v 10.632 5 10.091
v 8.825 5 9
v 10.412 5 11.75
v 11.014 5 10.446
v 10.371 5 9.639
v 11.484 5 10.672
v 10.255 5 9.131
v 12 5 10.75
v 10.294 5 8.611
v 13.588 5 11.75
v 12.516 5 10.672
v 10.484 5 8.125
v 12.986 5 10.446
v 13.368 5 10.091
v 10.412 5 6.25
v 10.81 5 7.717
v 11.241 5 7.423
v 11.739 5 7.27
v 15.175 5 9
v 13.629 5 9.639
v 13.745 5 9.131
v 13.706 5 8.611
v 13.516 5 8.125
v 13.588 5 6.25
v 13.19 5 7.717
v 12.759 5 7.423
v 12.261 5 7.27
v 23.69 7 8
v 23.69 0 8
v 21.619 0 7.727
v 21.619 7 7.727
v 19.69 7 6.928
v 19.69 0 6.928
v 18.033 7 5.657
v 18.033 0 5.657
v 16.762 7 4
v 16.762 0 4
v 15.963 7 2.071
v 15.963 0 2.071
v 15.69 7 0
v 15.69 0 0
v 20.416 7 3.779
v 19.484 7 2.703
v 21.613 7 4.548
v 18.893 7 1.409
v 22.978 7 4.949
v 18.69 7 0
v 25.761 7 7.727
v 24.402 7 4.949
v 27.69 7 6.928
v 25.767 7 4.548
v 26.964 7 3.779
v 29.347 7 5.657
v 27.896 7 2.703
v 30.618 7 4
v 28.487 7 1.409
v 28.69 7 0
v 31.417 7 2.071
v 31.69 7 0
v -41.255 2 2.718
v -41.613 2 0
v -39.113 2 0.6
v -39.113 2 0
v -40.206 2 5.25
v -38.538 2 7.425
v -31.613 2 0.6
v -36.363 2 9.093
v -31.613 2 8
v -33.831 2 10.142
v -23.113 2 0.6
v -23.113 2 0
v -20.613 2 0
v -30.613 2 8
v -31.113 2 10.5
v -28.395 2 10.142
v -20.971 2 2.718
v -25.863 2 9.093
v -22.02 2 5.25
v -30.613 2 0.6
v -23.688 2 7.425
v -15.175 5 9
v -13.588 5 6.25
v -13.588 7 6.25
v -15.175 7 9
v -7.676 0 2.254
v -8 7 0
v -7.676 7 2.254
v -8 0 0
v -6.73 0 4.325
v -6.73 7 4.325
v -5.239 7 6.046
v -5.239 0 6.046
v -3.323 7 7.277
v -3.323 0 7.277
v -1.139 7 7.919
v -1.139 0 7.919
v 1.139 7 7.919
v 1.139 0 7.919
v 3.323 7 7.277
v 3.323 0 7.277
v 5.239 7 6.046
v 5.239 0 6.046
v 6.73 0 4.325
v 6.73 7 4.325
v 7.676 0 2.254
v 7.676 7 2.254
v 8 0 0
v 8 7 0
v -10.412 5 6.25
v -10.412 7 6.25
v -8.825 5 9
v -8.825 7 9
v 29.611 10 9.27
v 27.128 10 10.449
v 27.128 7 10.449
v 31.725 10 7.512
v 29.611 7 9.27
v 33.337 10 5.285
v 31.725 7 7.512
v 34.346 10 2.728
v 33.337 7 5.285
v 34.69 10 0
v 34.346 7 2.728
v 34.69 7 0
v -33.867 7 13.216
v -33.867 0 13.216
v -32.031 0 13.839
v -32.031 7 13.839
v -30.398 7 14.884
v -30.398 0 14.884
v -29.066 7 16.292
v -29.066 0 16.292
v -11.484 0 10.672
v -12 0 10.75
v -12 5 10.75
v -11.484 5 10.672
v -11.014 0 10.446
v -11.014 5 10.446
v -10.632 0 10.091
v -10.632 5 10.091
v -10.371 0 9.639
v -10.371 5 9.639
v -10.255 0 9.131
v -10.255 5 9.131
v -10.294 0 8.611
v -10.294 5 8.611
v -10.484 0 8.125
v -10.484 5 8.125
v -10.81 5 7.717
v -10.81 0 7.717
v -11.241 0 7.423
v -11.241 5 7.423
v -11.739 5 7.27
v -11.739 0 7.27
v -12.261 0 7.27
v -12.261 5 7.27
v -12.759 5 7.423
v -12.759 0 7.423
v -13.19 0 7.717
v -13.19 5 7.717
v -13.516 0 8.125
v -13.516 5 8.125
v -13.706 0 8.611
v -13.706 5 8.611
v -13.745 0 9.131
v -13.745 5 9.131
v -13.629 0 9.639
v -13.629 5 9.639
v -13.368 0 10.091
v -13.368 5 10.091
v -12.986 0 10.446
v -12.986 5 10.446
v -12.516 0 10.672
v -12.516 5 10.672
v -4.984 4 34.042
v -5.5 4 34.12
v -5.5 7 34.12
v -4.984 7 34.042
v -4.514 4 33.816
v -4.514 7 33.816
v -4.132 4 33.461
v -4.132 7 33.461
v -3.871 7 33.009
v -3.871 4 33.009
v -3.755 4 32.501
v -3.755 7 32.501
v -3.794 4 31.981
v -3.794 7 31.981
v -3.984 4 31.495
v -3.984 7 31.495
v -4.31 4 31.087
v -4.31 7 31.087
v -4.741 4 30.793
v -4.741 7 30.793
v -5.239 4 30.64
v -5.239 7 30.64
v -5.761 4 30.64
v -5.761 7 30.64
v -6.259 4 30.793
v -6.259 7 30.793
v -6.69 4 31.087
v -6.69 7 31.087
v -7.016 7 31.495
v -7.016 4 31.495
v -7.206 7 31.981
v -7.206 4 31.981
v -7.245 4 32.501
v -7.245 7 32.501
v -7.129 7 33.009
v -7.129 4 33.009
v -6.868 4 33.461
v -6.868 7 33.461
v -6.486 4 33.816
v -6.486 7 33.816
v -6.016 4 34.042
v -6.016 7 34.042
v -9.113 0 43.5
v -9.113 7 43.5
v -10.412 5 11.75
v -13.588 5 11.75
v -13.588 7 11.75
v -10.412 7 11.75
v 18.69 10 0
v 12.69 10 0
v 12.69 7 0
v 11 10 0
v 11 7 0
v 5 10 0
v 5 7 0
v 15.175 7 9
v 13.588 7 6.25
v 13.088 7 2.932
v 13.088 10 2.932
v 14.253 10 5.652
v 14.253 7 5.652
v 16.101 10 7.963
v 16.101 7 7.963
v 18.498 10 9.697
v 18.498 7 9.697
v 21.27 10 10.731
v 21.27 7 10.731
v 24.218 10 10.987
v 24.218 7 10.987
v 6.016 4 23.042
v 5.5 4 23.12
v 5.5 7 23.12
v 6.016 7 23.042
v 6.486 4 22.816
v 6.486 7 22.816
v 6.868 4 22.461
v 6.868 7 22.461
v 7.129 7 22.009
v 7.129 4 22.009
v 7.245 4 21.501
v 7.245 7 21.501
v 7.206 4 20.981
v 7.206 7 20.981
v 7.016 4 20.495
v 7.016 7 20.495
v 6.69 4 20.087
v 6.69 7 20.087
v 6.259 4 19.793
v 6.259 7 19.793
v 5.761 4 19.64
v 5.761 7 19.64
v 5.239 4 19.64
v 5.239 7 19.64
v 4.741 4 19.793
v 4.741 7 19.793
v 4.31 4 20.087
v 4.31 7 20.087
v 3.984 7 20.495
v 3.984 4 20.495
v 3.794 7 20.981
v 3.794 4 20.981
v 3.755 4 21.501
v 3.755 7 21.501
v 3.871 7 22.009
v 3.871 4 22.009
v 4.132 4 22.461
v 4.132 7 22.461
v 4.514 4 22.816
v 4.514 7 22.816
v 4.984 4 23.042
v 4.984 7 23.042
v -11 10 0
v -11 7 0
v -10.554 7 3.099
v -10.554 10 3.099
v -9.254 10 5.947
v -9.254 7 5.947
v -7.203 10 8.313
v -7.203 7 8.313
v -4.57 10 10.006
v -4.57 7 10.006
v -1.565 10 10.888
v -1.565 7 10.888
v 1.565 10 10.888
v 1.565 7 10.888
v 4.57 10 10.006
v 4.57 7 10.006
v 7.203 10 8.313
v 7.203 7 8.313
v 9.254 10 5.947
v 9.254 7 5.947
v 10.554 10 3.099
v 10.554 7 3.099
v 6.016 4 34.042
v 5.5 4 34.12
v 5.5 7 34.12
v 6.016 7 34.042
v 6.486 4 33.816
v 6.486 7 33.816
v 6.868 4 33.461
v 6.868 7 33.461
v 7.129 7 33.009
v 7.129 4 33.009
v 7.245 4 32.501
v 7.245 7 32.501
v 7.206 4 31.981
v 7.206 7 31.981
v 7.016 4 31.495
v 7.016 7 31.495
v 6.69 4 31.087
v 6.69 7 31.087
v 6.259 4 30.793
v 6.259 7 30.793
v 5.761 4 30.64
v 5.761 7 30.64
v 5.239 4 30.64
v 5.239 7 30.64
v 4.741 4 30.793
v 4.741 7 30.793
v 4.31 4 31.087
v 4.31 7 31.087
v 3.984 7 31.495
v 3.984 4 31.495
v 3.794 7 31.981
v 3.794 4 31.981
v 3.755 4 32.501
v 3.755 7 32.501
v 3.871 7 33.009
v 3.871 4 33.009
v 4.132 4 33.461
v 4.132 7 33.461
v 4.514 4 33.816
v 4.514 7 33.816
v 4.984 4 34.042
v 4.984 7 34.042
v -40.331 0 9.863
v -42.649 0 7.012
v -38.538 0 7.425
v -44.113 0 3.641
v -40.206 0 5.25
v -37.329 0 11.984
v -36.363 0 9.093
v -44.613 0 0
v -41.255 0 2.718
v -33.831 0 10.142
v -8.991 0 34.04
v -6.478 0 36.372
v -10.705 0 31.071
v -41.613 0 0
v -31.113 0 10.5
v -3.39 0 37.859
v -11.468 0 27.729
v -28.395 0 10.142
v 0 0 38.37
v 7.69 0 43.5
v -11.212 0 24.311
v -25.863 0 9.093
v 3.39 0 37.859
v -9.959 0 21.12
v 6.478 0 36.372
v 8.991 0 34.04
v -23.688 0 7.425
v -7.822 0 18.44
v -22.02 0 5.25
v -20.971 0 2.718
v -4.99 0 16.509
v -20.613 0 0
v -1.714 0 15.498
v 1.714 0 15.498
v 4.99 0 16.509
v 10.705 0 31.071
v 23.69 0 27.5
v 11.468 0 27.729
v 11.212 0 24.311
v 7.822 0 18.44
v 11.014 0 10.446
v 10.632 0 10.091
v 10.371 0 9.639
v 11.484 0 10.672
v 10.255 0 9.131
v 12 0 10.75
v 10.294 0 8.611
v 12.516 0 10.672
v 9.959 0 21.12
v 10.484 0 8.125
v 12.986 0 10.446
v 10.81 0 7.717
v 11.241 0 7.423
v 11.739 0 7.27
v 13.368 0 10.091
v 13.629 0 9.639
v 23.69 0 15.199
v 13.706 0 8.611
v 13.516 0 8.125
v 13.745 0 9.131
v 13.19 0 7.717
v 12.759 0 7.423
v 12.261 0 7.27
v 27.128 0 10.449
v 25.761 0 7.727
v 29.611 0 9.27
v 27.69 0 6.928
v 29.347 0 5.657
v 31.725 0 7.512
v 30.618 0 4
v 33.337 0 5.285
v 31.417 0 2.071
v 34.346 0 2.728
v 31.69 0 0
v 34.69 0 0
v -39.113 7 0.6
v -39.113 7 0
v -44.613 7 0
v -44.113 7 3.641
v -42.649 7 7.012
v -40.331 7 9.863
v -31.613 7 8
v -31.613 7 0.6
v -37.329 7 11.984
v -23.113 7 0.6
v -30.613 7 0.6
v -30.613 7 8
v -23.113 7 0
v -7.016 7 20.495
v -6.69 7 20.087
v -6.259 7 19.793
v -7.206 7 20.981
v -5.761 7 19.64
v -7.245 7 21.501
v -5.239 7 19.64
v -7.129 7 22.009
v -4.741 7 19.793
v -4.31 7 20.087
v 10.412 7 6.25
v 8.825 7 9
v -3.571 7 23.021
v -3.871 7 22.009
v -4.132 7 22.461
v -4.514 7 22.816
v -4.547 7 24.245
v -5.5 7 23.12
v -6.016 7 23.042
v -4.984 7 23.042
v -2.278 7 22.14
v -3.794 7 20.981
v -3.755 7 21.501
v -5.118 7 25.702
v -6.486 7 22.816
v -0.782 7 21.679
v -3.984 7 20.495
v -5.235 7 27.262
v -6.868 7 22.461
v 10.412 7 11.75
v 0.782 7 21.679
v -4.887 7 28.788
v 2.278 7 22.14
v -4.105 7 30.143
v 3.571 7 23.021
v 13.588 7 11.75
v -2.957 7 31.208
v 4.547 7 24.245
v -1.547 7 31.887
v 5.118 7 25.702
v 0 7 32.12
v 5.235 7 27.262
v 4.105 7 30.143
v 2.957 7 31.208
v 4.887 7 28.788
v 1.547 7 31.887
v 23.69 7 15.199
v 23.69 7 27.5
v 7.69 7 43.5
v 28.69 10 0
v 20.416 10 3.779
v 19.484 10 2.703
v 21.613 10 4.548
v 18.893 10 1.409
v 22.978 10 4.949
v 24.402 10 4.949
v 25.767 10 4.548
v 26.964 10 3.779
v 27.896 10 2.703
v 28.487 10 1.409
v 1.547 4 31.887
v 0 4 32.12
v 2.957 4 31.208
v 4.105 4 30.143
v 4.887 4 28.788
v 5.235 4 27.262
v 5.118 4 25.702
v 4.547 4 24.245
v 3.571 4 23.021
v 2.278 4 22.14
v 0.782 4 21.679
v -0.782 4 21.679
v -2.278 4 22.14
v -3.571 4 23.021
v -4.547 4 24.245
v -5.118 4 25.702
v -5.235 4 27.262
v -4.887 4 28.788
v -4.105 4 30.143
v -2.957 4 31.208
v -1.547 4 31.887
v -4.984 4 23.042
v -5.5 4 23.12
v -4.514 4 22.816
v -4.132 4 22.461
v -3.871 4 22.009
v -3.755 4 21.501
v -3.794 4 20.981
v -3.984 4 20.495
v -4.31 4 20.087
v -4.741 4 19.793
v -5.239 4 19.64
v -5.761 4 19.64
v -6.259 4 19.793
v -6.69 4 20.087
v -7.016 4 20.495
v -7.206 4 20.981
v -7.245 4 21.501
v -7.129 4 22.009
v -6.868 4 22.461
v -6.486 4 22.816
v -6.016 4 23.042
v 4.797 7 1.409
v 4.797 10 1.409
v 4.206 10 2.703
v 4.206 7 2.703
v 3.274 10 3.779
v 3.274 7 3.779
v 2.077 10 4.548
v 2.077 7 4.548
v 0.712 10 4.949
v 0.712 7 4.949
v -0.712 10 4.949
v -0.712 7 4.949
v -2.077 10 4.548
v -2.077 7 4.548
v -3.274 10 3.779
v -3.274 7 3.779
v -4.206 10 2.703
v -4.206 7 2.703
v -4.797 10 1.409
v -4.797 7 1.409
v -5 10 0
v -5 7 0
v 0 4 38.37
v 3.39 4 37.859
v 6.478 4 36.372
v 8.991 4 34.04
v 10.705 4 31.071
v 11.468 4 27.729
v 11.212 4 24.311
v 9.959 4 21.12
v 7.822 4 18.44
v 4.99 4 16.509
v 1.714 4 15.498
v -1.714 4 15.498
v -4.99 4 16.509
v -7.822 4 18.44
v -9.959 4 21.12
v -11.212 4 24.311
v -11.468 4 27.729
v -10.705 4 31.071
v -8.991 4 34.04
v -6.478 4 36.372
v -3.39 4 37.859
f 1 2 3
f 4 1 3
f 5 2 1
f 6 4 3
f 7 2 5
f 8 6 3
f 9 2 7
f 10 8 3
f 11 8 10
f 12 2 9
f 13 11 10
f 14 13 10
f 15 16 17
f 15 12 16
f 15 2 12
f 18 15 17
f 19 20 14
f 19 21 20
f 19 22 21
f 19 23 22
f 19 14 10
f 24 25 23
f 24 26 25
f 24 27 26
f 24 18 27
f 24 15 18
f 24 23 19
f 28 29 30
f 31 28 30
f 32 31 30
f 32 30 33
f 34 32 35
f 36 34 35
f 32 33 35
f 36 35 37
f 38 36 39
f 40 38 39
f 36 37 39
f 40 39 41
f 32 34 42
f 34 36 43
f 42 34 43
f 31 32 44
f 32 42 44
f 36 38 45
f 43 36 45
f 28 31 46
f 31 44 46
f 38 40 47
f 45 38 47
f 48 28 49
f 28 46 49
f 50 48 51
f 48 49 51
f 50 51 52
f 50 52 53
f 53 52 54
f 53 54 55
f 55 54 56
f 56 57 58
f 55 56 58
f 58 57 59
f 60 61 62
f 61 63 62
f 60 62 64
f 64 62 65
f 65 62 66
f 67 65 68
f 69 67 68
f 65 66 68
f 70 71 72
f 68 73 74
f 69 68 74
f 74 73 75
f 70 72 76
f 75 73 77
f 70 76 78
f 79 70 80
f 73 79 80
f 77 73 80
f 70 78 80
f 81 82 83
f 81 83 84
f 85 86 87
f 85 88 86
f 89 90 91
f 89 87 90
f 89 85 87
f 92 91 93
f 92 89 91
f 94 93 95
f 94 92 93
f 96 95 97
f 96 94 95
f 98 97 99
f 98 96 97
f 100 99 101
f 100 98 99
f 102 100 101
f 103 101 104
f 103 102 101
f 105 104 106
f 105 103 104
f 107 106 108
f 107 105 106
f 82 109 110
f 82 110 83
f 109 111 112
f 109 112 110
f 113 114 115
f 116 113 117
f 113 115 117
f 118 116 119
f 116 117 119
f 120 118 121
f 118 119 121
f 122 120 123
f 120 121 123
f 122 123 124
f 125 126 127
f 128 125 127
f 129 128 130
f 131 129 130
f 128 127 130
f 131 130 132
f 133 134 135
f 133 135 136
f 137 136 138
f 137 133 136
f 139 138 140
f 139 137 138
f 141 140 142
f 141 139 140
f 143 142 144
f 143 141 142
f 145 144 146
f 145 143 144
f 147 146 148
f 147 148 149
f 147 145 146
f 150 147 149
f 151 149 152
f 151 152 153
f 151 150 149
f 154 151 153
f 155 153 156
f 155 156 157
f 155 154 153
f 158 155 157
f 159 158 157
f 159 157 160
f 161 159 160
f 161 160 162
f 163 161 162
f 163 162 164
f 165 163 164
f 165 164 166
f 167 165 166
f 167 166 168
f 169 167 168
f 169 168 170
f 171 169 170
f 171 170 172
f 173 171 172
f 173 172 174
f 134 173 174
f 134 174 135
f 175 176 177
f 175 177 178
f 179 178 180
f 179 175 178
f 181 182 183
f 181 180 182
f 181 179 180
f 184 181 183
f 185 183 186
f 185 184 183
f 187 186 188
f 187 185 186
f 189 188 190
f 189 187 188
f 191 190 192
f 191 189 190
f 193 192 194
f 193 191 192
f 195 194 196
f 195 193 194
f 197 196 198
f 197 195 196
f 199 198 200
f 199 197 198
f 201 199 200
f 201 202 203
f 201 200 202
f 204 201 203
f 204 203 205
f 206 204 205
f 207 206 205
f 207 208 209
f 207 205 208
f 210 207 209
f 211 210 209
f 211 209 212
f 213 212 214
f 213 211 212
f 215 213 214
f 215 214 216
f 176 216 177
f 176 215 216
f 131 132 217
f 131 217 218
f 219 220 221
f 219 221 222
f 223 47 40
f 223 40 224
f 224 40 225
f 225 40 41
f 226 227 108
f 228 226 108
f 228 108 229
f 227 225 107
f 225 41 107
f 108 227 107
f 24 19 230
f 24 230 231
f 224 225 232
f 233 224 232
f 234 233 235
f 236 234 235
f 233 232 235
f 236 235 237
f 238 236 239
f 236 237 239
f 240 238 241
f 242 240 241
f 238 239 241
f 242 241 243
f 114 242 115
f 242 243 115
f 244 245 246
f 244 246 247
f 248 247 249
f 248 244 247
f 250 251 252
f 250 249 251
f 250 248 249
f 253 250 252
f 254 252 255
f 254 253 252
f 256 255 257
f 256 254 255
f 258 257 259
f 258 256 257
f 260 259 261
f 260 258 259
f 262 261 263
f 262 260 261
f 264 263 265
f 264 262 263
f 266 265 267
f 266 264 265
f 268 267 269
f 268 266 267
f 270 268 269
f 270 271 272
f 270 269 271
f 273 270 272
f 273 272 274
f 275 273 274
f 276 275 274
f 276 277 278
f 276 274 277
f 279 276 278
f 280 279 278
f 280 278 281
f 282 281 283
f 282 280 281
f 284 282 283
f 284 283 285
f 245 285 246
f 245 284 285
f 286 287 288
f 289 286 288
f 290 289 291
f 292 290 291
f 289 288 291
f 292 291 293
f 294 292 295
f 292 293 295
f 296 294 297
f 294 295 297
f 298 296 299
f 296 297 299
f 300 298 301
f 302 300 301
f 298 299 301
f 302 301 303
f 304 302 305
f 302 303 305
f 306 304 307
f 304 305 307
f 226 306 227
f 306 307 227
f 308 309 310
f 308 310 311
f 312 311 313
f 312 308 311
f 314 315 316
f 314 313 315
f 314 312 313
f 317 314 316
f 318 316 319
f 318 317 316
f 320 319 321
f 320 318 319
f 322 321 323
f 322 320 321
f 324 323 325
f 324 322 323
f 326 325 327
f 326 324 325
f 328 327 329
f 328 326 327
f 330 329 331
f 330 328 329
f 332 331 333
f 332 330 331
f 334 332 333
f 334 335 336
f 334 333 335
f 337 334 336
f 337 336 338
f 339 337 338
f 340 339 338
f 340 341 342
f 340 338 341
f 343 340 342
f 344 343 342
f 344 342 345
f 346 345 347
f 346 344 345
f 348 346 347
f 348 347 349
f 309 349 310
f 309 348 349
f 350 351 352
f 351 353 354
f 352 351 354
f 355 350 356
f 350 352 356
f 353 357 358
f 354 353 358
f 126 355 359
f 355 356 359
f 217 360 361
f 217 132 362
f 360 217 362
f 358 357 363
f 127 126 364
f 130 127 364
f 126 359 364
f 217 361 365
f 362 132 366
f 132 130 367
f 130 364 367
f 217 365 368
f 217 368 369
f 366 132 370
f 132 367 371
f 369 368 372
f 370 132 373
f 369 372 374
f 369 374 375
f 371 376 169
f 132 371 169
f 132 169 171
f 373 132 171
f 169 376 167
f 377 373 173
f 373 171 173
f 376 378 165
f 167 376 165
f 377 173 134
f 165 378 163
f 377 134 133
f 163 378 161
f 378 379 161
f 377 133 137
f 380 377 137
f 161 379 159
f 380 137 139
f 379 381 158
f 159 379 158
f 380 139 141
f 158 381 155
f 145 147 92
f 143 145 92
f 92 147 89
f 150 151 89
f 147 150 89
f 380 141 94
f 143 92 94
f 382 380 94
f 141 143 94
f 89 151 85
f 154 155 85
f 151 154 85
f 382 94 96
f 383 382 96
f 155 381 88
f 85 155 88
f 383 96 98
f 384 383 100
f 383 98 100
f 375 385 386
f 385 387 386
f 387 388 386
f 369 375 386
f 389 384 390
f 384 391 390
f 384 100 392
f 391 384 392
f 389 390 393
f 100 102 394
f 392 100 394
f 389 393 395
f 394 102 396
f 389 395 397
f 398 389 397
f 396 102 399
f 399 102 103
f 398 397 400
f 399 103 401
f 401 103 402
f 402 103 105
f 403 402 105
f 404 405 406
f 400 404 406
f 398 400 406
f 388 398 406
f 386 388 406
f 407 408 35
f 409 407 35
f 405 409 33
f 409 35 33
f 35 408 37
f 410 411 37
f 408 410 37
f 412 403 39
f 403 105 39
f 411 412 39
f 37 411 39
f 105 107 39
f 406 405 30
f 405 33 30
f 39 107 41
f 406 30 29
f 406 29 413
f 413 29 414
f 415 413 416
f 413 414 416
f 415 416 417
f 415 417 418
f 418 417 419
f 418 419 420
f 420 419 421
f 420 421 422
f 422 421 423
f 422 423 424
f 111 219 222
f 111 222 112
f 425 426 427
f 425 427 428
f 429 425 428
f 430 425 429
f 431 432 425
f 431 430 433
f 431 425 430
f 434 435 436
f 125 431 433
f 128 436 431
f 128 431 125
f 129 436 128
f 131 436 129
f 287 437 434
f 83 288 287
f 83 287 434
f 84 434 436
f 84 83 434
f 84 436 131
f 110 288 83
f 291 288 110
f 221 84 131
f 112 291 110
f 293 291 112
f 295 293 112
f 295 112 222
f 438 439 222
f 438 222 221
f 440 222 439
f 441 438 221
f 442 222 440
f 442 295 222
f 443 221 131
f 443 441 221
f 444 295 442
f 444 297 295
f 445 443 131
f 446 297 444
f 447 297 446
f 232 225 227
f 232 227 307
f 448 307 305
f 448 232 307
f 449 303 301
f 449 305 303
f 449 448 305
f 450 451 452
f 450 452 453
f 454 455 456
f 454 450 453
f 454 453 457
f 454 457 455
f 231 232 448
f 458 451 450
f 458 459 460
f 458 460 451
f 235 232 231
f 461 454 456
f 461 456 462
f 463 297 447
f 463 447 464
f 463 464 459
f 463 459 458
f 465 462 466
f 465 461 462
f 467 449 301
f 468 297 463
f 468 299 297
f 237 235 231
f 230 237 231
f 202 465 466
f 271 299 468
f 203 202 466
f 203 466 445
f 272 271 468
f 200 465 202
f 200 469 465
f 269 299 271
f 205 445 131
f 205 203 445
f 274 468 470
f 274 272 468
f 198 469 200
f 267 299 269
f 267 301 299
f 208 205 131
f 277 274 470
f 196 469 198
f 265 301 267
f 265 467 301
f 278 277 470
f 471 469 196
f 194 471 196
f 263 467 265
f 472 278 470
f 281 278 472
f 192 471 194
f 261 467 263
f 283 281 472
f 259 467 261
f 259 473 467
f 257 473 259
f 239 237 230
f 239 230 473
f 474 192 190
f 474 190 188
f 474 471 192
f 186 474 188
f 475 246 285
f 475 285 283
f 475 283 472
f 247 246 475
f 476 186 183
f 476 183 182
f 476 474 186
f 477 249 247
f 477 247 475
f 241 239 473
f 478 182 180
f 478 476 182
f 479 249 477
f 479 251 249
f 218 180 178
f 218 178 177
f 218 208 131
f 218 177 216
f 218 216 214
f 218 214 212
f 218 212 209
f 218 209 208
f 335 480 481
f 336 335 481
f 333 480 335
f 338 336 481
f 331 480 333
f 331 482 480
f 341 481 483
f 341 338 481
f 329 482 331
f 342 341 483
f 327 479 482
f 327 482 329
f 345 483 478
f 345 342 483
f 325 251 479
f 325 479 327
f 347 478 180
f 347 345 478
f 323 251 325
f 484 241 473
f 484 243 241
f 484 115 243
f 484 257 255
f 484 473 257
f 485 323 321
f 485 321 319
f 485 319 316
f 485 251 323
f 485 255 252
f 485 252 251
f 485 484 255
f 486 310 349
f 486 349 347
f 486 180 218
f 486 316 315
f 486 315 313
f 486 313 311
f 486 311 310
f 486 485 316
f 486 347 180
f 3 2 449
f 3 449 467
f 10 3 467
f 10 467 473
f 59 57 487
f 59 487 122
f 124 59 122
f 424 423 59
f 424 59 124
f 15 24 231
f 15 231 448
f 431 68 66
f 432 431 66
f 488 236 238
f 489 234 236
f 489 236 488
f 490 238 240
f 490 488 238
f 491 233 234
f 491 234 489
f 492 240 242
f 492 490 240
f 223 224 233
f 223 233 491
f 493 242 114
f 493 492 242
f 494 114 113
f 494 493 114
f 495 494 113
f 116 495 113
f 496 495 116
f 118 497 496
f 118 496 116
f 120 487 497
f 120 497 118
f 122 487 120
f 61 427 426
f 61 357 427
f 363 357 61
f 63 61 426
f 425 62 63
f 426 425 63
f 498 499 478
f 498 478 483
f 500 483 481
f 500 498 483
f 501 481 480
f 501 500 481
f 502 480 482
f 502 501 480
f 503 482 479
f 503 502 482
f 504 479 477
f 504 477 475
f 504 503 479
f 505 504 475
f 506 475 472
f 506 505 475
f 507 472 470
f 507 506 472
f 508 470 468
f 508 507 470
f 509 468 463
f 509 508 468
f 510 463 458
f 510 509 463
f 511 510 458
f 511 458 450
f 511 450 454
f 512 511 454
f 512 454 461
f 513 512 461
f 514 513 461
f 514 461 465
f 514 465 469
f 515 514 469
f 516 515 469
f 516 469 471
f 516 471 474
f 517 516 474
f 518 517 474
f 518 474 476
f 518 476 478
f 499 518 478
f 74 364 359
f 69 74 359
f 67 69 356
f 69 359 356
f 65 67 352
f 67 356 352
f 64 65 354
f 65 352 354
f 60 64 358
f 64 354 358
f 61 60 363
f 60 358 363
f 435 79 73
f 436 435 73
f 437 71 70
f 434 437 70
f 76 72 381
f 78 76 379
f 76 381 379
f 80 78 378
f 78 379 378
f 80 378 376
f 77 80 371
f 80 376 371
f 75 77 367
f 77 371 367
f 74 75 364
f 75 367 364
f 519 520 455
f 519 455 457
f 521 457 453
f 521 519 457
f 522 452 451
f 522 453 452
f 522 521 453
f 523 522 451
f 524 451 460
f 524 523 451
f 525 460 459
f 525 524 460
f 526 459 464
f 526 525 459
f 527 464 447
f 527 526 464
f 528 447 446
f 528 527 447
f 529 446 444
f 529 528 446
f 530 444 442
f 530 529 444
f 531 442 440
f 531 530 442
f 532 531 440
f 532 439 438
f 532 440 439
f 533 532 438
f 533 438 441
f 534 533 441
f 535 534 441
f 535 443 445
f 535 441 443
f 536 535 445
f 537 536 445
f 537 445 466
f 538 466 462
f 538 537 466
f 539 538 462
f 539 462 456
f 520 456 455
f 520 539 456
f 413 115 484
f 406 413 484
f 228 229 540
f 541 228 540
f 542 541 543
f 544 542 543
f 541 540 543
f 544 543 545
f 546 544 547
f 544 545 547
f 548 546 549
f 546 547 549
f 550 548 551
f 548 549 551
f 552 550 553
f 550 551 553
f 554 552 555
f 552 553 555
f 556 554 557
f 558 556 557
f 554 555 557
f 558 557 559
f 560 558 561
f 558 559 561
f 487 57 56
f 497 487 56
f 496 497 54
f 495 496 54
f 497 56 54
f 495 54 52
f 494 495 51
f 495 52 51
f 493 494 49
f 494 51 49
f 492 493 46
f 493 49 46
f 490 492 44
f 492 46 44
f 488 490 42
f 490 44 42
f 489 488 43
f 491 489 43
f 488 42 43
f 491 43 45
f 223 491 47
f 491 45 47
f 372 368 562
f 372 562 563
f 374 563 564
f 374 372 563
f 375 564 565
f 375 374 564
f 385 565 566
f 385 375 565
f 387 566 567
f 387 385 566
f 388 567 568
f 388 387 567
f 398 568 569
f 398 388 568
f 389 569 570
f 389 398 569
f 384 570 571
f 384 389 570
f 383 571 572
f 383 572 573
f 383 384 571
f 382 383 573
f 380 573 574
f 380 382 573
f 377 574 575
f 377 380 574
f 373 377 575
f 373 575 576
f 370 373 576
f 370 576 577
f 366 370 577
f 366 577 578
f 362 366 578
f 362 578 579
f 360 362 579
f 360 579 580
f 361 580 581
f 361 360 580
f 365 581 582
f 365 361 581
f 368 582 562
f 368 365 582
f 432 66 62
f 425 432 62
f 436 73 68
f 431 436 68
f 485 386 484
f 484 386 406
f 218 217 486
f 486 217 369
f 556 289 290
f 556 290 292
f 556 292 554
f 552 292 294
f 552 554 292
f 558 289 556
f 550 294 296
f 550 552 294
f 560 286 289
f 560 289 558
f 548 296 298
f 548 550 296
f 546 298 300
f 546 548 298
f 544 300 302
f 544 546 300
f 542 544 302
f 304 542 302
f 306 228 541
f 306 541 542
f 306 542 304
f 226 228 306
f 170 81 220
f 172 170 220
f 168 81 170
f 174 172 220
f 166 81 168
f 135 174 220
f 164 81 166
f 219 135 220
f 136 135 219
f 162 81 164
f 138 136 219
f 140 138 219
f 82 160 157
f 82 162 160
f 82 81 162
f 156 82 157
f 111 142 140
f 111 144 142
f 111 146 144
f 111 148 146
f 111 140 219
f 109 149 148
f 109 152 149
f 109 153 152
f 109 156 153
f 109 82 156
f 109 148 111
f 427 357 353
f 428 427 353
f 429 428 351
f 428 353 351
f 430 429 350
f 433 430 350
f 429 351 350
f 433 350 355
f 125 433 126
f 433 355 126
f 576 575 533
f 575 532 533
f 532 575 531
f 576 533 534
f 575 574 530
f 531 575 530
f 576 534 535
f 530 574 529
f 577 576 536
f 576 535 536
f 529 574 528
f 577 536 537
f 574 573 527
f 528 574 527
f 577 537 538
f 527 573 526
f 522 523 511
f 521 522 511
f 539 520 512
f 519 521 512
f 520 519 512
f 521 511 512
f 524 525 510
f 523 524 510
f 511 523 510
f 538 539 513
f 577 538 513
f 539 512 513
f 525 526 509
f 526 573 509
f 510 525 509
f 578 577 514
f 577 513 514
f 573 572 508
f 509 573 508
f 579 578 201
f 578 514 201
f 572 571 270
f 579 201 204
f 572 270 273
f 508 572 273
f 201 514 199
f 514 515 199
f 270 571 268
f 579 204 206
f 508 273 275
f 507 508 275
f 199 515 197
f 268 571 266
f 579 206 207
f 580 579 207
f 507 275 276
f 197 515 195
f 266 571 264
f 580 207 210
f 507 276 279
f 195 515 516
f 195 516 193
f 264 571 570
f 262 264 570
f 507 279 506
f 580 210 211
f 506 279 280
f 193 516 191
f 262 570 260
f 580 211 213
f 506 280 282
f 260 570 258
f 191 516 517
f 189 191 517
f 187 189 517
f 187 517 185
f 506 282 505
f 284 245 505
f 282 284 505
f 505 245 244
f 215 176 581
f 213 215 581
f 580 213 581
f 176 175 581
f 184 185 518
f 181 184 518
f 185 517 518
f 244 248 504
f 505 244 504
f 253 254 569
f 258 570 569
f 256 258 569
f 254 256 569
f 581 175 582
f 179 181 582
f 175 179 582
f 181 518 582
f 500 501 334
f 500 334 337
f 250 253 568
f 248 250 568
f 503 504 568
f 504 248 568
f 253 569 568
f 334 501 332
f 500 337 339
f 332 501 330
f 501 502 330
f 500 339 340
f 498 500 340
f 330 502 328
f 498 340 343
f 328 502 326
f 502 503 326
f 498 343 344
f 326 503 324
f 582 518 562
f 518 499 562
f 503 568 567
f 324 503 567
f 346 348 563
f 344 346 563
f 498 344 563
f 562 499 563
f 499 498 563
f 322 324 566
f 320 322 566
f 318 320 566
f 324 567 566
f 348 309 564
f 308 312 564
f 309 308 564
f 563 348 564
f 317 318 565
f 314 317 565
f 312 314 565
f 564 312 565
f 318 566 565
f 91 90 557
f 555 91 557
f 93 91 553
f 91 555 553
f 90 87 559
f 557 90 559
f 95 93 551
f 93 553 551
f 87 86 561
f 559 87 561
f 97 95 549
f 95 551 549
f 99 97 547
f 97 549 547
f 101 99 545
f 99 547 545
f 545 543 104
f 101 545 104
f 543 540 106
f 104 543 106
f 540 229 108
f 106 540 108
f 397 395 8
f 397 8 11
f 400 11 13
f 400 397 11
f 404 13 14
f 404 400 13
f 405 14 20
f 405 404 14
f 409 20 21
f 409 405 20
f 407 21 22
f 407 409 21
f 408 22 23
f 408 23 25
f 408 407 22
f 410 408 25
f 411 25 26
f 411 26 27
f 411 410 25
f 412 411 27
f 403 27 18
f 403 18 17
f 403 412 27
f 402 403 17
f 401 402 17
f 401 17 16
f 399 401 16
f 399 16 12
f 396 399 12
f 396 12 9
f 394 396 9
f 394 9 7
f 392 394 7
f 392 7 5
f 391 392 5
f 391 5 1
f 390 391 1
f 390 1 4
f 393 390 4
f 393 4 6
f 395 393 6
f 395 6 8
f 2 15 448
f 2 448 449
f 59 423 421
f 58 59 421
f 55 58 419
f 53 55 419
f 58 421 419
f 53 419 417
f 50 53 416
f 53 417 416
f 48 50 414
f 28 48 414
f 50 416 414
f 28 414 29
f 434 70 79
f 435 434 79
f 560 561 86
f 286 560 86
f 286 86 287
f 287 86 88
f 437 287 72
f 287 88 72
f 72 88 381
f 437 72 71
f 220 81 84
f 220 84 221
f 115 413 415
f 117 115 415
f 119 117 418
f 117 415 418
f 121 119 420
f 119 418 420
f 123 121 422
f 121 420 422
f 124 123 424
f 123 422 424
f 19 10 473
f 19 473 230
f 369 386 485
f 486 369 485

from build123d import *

# Parameters (mm, degrees)
SKETCH3_R               = 8
SKETCH3_W               = 54.803
SKETCH3_H               = 30
SKETCH3_R_2             = 5.25
BOSS_EXTRUDE1_DEPTH     = 7
CUT_EXTRUDE3_DEPTH      = 63.702230973
CUT_EXTRUDE3_DEPTH_BACK = 63.702230973
SKETCH4_R               = 1.75
CHAMFER1_SIZE           = 2.5
CUT_EXTRUDE5_DEPTH      = 63.702230973
CUT_EXTRUDE5_DEPTH_BACK = 63.702230973
SKETCH9_R               = 1.75
CUT_EXTRUDE6_START      = -2
SKETCH10_R              = 1.75
CUT_EXTRUDE6_DEPTH      = 2
CHAMFER3_SIZE2          = 22
CHAMFER3_SIZE           = 30
CHAMFER4_SIZE           = 16
FILLET1_DEPTH           = 7
BOSS_EXTRUDE6_START     = -5
SKETCH15_R              = 10.5
BOSS_EXTRUDE6_DEPTH     = 5
CUT_EXTRUDE7_DEPTH      = 63.702230973
CUT_EXTRUDE7_DEPTH_BACK = 63.702230973
SKETCH16_W              = 93.911326915
SKETCH16_H              = 20.32689663
SKETCH17_R              = 11.5
SKETCH17_R_2            = 5.25
CUT_EXTRUDE8_DEPTH      = 4
BOSS_EXTRUDE7_DEPTH     = 3


with BuildPart() as part:
    # Sketch3 → Boss-Extrude1 (new body)
    # profile 1 of 10: a face of its own
    with BuildSketch(Plane(origin=(0, 0, 0), x_dir=(1, 0, 0), z_dir=(0, 1, 0))):
        with BuildLine():
            ThreePointArc((-17.613, 0), (-21.567058454, 9.545941546), (-31.113, 13.5))
            Line((-31.113, 13.5), (-31.113, 10.5))
            ThreePointArc((-31.113, 10.5), (-23.688378798, 7.424621202), (-20.613, 0))
            ThreePointArc((-20.613, 0), (-23.688378798, -7.424621202), (-31.113, -10.5))
            Line((-31.113, -10.5), (-31.113, -13.5))
            ThreePointArc((-31.113, -13.5), (-21.567058454, -9.545941546), (-17.613, 0))
        make_face()
    # profile 2 of 10: a face of its own
    with BuildSketch(Plane(origin=(0, 0, 0), x_dir=(1, 0, 0), z_dir=(0, 1, 0))):
        with BuildLine():
            Line((-31.113, 10.5), (-31.113, 13.5))
            ThreePointArc((-31.113, 13.5), (-44.613, 0), (-31.113, -13.5))
            Line((-31.113, -13.5), (-31.113, -10.5))
            ThreePointArc((-31.113, -10.5), (-41.613, 0), (-31.113, 10.5))
        make_face()
    # profile 3 of 10: a face of its own
    with BuildSketch(Plane(origin=(0, 0, 0), x_dir=(1, 0, 0), z_dir=(0, 1, 0))):
        with BuildLine():
            Line((23.69, 13.5), (-31.113, 13.5))
            ThreePointArc((-31.113, 13.5), (-21.567058454, 9.545941546), (-17.613, 0))
            ThreePointArc((-17.613, 0), (-21.567058454, -9.545941546), (-31.113, -13.5))
            Line((-31.113, -13.5), (23.69, -13.5))
            Line((23.69, -13.5), (23.69, -11))
            ThreePointArc((23.69, -11), (12.69, 0), (23.69, 11))
            Line((23.69, 11), (23.69, 13.5))
        make_face()
        with Locations(Location((0, 0, 0), (0, 0, 270))):
            Circle(SKETCH3_R, mode=Mode.SUBTRACT)
    # profile 4 of 10: a face of its own
    with BuildSketch(Plane(origin=(0, 0, 0), x_dir=(1, 0, 0), z_dir=(0, 1, 0))):
        with BuildLine():
            ThreePointArc((-17.613, 0), (-21.567058454, 9.545941546), (-31.113, 13.5))
            Line((-31.113, 13.5), (-31.113, 10.5))
            ThreePointArc((-31.113, 10.5), (-23.688378798, 7.424621202), (-20.613, 0))
            ThreePointArc((-20.613, 0), (-23.688378798, -7.424621202), (-31.113, -10.5))
            Line((-31.113, -10.5), (-31.113, -13.5))
            ThreePointArc((-31.113, -13.5), (-21.567058454, -9.545941546), (-17.613, 0))
        make_face()
    # profile 5 of 10: a face of its own
    with BuildSketch(Plane(origin=(0, 0, 0), x_dir=(1, 0, 0), z_dir=(0, 1, 0))):
        with BuildLine():
            Line((-31.113, 10.5), (-31.113, 13.5))
            ThreePointArc((-31.113, 13.5), (-44.613, 0), (-31.113, -13.5))
            Line((-31.113, -13.5), (-31.113, -10.5))
            ThreePointArc((-31.113, -10.5), (-41.613, 0), (-31.113, 10.5))
        make_face()
    # profile 6 of 10: a face of its own
    with BuildSketch(Plane(origin=(0, 0, 0), x_dir=(1, 0, 0), z_dir=(0, 1, 0))):
        with BuildLine():
            ThreePointArc((34.69, 0), (31.468174593, 7.778174593), (23.69, 11))
            Line((23.69, 11), (23.69, 8))
            ThreePointArc((23.69, 8), (29.346854249, 5.656854249), (31.69, 0))
            ThreePointArc((31.69, 0), (29.346854249, -5.656854249), (23.69, -8))
            Line((23.69, -8), (23.69, -11))
            ThreePointArc((23.69, -11), (31.468174593, -7.778174593), (34.69, 0))
        make_face()
    # profile 7 of 10: a face of its own
    with BuildSketch(Plane(origin=(0, 0, 0), x_dir=(1, 0, 0), z_dir=(0, 1, 0))):
        with BuildLine():
            Line((23.69, 8), (23.69, 11))
            ThreePointArc((23.69, 11), (12.69, 0), (23.69, -11))
            Line((23.69, -11), (23.69, -8))
            ThreePointArc((23.69, -8), (15.69, 0), (23.69, 8))
        make_face()
    # profile 8 of 10: a face of its own
    with BuildSketch(Plane(origin=(0, 0, 0), x_dir=(1, 0, 0), z_dir=(0, 1, 0))):
        with Locations((-3.7115, -28.5)):
            Rectangle(SKETCH3_W, SKETCH3_H)
        with Locations(Location((0, -26.87, 0), (0, 0, 270))):
            Circle(SKETCH3_R_2, mode=Mode.SUBTRACT)
    # profile 9 of 10: a face of its own
    with BuildSketch(Plane(origin=(0, 0, 0), x_dir=(1, 0, 0), z_dir=(0, 1, 0))):
        with BuildLine():
            ThreePointArc((34.69, 0), (31.468174593, 7.778174593), (23.69, 11))
            Line((23.69, 11), (23.69, 8))
            ThreePointArc((23.69, 8), (29.346854249, 5.656854249), (31.69, 0))
            ThreePointArc((31.69, 0), (29.346854249, -5.656854249), (23.69, -8))
            Line((23.69, -8), (23.69, -11))
            ThreePointArc((23.69, -11), (31.468174593, -7.778174593), (34.69, 0))
        make_face()
    # profile 10 of 10: a face of its own
    with BuildSketch(Plane(origin=(0, 0, 0), x_dir=(1, 0, 0), z_dir=(0, 1, 0))):
        with BuildLine():
            Line((23.69, 8), (23.69, 11))
            ThreePointArc((23.69, 11), (12.69, 0), (23.69, -11))
            Line((23.69, -11), (23.69, -8))
            ThreePointArc((23.69, -8), (15.69, 0), (23.69, 8))
        make_face()
    extrude(amount=BOSS_EXTRUDE1_DEPTH)

    # Sketch4 → Cut-Extrude3 (cut, two sides: drawn at the far end of the back side and taken through both)
    with BuildSketch(Plane(origin=(0, 0, 0), x_dir=(1, 0, 0), z_dir=(0, 1, 0)).offset(-CUT_EXTRUDE3_DEPTH_BACK)):
        with Locations(Location((5.5, -21.37, 0), (0, 0, 270))):
            Circle(SKETCH4_R)
        with Locations(Location((5.5, -32.37, 0), (0, 0, 270))):
            Circle(SKETCH4_R)
        with Locations(Location((-5.5, -32.37, 0), (0, 0, 270))):
            Circle(SKETCH4_R)
        with Locations(Location((-5.5, -21.37, 0), (0, 0, 270))):
            Circle(SKETCH4_R)
    extrude(amount=CUT_EXTRUDE3_DEPTH + CUT_EXTRUDE3_DEPTH_BACK, mode=Mode.SUBTRACT)

    # Chamfer1
    # the kernel refuses this chamfer: 2.5 mm, written as the material it adds along each edge
    with BuildSketch(Plane(origin=(23.69, 0, -11), x_dir=(0, 0, -1), z_dir=(0, 1, 0))) as chamfer1_piece_1_section:
        with BuildLine():
            Line((CHAMFER1_SIZE, 0), (-0.385093792, -2.885093792))
            ThreePointArc((-0.385093792, -2.885093792), (-0.102088007, -1.495163601), (0, 0))
            Line((0, 0), (CHAMFER1_SIZE, 0))
        make_face()
    chamfer1_piece_1 = extrude(amount=7, mode=Mode.PRIVATE)
    chamfer1_piece_1 = split(chamfer1_piece_1, bisect_by=Plane(origin=(23.69, 0, -13.5), z_dir=(0, 0, 1)), keep=Keep.TOP, mode=Mode.PRIVATE)
    add(chamfer1_piece_1)

    # Sketch9 → Cut-Extrude5 (cut, two sides: drawn at the far end of the back side and taken through both)
    with BuildSketch(Plane(origin=(0, 0, 0), x_dir=(1, 0, 0), z_dir=(0, 1, 0)).offset(-CUT_EXTRUDE5_DEPTH_BACK)):
        with Locations(Location((12, 9, 0), (0, 0, 270))):
            Circle(SKETCH9_R)
        with Locations(Location((12, -9, 0), (0, 0, 270))):
            Circle(SKETCH9_R)
        with Locations(Location((-12, -9, 0), (0, 0, 270))):
            Circle(SKETCH9_R)
        with Locations(Location((-12, 9, 0), (0, 0, 270))):
            Circle(SKETCH9_R)
    extrude(amount=CUT_EXTRUDE5_DEPTH + CUT_EXTRUDE5_DEPTH_BACK, mode=Mode.SUBTRACT)

    # Sketch10 → Cut-Extrude6 (cut)
    # profile 1 of 4: a face of its own
    with BuildSketch(Plane(origin=(0, 7, 0), x_dir=(1, 0, 0), z_dir=(0, 1, 0)).offset(CUT_EXTRUDE6_START)):
        Polygon((-15.175426481, -9), (-13.58771324, -11.75), (-10.41228676, -11.75), (-8.824573519, -9), (-10.41228676, -6.25), (-13.58771324, -6.25), align=None)
        with Locations(Location((-12, -9, 0), (0, 0, 270))):
            Circle(SKETCH10_R, mode=Mode.SUBTRACT)
    # profile 2 of 4: a face of its own
    with BuildSketch(Plane(origin=(0, 7, 0), x_dir=(1, 0, 0), z_dir=(0, 1, 0)).offset(CUT_EXTRUDE6_START)):
        Polygon((-15.175426481, 9), (-13.58771324, 6.25), (-10.41228676, 6.25), (-8.824573519, 9), (-10.41228676, 11.75), (-13.58771324, 11.75), align=None)
        with Locations(Location((-12, 9, 0), (0, 0, 270))):
            Circle(SKETCH10_R, mode=Mode.SUBTRACT)
    # profile 3 of 4: a face of its own
    with BuildSketch(Plane(origin=(0, 7, 0), x_dir=(1, 0, 0), z_dir=(0, 1, 0)).offset(CUT_EXTRUDE6_START)):
        Polygon((15.175426481, 9), (13.58771324, 11.75), (10.41228676, 11.75), (8.824573519, 9), (10.41228676, 6.25), (13.58771324, 6.25), align=None)
        with Locations(Location((12, 9, 0), (0, 0, 270))):
            Circle(SKETCH10_R, mode=Mode.SUBTRACT)
    # profile 4 of 4: a face of its own
    with BuildSketch(Plane(origin=(0, 7, 0), x_dir=(1, 0, 0), z_dir=(0, 1, 0)).offset(CUT_EXTRUDE6_START)):
        Polygon((15.175426481, -9), (13.58771324, -6.25), (10.41228676, -6.25), (8.824573519, -9), (10.41228676, -11.75), (13.58771324, -11.75), align=None)
        with Locations(Location((12, -9, 0), (0, 0, 270))):
            Circle(SKETCH10_R, mode=Mode.SUBTRACT)
    extrude(amount=CUT_EXTRUDE6_DEPTH, mode=Mode.SUBTRACT)

    # Chamfer2
    # the kernel refuses this chamfer: 5 mm, written as the material it adds along each edge
    with BuildSketch(Plane(origin=(23.69, 0, 11), x_dir=(0.9874000606639179, 0, -0.15824386307497393), z_dir=(0, 1, 0))) as chamfer2_piece_1:
        with BuildLine():
            Line((3.622786344, 0.141421356), (-0.805837357, -4.287202344))
            Line((-0.805837357, -4.287202344), (-0.904577363, -4.271377958))
            ThreePointArc((-0.904577363, -4.271377958), (-0.443767224, -2.137054655), (-0.098740006, 0.015824386))
            Line((-0.098740006, 0.015824386), (0.015824386, 0.098740006))
            ThreePointArc((0.015824386, 0.098740006), (1.81210794, -0.038365312), (3.606961958, 0.240161362))
            Line((3.606961958, 0.240161362), (3.622786344, 0.141421356))
        make_face()
    extrude(amount=7)

    # Chamfer3
    chamfer3_edges = [part.edges().sort_by_distance(p)[0] for p in [
        (-31.113, 3.5, 43.5),
    ]]
    chamfer3_side = [part.faces().sort_by_distance(p)[0] for p in [
        (-31.113, 3.5, 43.06),
    ]]
    chamfer(chamfer3_edges, length=CHAMFER3_SIZE - 0.0001, length2=CHAMFER3_SIZE2 - 0.0001, reference=chamfer3_side[0])  # a hair under: the kernel refuses the full size

    # Chamfer4
    chamfer4_edges = [part.edges().sort_by_distance(p)[0] for p in [
        (23.69, 3.5, 43.5),
    ]]
    chamfer(chamfer4_edges, length=CHAMFER4_SIZE)

    # Fillet1: read off the stored shape, not the designer's step
    # Fillet1 outline → Fillet1 (add)
    with BuildSketch(Plane(origin=(0, 0, 0), x_dir=(1, 0, 0), z_dir=(0, 1, 0))):
        with BuildLine():
            ThreePointArc((-31.113, -13.5), (-32.497095712, -13.428859932), (-33.866604066, -13.21618949))
            ThreePointArc((-33.866604066, -13.21618949), (-31.169668779, -14.320275511), (-29.047129471, -16.317096176))
            Line((-29.047129471, -16.317096176), (-31.113, -13.5))
        make_face()
    extrude(amount=FILLET1_DEPTH)

    # Sketch15 → Boss-Extrude6 (add)
    with BuildSketch(Plane(origin=(0, 7, 0), x_dir=(1, 0, 0), z_dir=(0, 1, 0)).offset(BOSS_EXTRUDE6_START)):
        with Locations(Location((-31.113, 0, 0), (0, 0, 270))):
            Circle(SKETCH15_R)
        Polygon((-31.613, 0.6), (-31.613, 8), (-30.613, 8), (-30.613, 0.6), (-23.113, 0.6), (-23.113, -0.6), (-30.613, -0.6), (-30.613, -8), (-31.613, -8), (-31.613, -0.6), (-39.113, -0.6), (-39.113, 0.6), align=None, mode=Mode.SUBTRACT)
    extrude(amount=BOSS_EXTRUDE6_DEPTH)

    # Sketch16 → Cut-Extrude7 (cut, two sides: drawn at the far end of the back side and taken through both)
    with BuildSketch(Plane(origin=(0, 0, 0), x_dir=(1, 0, 0), z_dir=(0, 1, 0)).offset(-CUT_EXTRUDE7_DEPTH_BACK)):
        with Locations((-7.189027051, 10.163448315)):
            Rectangle(SKETCH16_W, SKETCH16_H)
    extrude(amount=CUT_EXTRUDE7_DEPTH + CUT_EXTRUDE7_DEPTH_BACK, mode=Mode.SUBTRACT)

    # Sketch17 → Cut-Extrude8 (cut)
    with BuildSketch(Plane(origin=(0, 0, 0), x_dir=(1, 0, 0), z_dir=(0, 1, 0))):
        with Locations(Location((0, -26.87, 0), (0, 0, 270))):
            Circle(SKETCH17_R)
        with Locations(Location((0, -26.87, 0), (0, 0, 270))):
            Circle(SKETCH17_R_2, mode=Mode.SUBTRACT)
    extrude(amount=CUT_EXTRUDE8_DEPTH, mode=Mode.SUBTRACT)

    # Sketch18 → Boss-Extrude7 (add)
    with BuildSketch(Plane(origin=(0, 7, 0), x_dir=(1, 0, 0), z_dir=(0, 1, 0))):
        with BuildLine():
            ThreePointArc((-8, 0), (0, -8), (8, 0))
            Line((8, 0), (5, 0))
            ThreePointArc((5, 0), (0, -5), (-5, 0))
            Line((-5, 0), (-8, 0))
        make_face()
        with BuildLine():
            ThreePointArc((-11, 0), (0, -11), (11, 0))
            Line((11, 0), (8, 0))
            ThreePointArc((8, 0), (0, -8), (-8, 0))
            Line((-8, 0), (-11, 0))
        make_face()
        with BuildLine():
            ThreePointArc((27.1275, -10.449095356), (32.60101846, -6.44932167), (34.69, 0))
            Line((34.69, 0), (31.69, 0))
            ThreePointArc((31.69, 0), (23.69, -8), (15.69, 0))
            Line((15.69, 0), (12.69, 0))
            ThreePointArc((12.69, 0), (17.24067833, -8.91101846), (27.1275, -10.449095356))
        make_face()
        with BuildLine():
            ThreePointArc((15.69, 0), (23.69, -8), (31.69, 0))
            Line((31.69, 0), (28.69, 0))
            ThreePointArc((28.69, 0), (23.69, -5), (18.69, 0))
            Line((18.69, 0), (15.69, 0))
        make_face()
    extrude(amount=BOSS_EXTRUDE7_DEPTH)


solid = part.part
